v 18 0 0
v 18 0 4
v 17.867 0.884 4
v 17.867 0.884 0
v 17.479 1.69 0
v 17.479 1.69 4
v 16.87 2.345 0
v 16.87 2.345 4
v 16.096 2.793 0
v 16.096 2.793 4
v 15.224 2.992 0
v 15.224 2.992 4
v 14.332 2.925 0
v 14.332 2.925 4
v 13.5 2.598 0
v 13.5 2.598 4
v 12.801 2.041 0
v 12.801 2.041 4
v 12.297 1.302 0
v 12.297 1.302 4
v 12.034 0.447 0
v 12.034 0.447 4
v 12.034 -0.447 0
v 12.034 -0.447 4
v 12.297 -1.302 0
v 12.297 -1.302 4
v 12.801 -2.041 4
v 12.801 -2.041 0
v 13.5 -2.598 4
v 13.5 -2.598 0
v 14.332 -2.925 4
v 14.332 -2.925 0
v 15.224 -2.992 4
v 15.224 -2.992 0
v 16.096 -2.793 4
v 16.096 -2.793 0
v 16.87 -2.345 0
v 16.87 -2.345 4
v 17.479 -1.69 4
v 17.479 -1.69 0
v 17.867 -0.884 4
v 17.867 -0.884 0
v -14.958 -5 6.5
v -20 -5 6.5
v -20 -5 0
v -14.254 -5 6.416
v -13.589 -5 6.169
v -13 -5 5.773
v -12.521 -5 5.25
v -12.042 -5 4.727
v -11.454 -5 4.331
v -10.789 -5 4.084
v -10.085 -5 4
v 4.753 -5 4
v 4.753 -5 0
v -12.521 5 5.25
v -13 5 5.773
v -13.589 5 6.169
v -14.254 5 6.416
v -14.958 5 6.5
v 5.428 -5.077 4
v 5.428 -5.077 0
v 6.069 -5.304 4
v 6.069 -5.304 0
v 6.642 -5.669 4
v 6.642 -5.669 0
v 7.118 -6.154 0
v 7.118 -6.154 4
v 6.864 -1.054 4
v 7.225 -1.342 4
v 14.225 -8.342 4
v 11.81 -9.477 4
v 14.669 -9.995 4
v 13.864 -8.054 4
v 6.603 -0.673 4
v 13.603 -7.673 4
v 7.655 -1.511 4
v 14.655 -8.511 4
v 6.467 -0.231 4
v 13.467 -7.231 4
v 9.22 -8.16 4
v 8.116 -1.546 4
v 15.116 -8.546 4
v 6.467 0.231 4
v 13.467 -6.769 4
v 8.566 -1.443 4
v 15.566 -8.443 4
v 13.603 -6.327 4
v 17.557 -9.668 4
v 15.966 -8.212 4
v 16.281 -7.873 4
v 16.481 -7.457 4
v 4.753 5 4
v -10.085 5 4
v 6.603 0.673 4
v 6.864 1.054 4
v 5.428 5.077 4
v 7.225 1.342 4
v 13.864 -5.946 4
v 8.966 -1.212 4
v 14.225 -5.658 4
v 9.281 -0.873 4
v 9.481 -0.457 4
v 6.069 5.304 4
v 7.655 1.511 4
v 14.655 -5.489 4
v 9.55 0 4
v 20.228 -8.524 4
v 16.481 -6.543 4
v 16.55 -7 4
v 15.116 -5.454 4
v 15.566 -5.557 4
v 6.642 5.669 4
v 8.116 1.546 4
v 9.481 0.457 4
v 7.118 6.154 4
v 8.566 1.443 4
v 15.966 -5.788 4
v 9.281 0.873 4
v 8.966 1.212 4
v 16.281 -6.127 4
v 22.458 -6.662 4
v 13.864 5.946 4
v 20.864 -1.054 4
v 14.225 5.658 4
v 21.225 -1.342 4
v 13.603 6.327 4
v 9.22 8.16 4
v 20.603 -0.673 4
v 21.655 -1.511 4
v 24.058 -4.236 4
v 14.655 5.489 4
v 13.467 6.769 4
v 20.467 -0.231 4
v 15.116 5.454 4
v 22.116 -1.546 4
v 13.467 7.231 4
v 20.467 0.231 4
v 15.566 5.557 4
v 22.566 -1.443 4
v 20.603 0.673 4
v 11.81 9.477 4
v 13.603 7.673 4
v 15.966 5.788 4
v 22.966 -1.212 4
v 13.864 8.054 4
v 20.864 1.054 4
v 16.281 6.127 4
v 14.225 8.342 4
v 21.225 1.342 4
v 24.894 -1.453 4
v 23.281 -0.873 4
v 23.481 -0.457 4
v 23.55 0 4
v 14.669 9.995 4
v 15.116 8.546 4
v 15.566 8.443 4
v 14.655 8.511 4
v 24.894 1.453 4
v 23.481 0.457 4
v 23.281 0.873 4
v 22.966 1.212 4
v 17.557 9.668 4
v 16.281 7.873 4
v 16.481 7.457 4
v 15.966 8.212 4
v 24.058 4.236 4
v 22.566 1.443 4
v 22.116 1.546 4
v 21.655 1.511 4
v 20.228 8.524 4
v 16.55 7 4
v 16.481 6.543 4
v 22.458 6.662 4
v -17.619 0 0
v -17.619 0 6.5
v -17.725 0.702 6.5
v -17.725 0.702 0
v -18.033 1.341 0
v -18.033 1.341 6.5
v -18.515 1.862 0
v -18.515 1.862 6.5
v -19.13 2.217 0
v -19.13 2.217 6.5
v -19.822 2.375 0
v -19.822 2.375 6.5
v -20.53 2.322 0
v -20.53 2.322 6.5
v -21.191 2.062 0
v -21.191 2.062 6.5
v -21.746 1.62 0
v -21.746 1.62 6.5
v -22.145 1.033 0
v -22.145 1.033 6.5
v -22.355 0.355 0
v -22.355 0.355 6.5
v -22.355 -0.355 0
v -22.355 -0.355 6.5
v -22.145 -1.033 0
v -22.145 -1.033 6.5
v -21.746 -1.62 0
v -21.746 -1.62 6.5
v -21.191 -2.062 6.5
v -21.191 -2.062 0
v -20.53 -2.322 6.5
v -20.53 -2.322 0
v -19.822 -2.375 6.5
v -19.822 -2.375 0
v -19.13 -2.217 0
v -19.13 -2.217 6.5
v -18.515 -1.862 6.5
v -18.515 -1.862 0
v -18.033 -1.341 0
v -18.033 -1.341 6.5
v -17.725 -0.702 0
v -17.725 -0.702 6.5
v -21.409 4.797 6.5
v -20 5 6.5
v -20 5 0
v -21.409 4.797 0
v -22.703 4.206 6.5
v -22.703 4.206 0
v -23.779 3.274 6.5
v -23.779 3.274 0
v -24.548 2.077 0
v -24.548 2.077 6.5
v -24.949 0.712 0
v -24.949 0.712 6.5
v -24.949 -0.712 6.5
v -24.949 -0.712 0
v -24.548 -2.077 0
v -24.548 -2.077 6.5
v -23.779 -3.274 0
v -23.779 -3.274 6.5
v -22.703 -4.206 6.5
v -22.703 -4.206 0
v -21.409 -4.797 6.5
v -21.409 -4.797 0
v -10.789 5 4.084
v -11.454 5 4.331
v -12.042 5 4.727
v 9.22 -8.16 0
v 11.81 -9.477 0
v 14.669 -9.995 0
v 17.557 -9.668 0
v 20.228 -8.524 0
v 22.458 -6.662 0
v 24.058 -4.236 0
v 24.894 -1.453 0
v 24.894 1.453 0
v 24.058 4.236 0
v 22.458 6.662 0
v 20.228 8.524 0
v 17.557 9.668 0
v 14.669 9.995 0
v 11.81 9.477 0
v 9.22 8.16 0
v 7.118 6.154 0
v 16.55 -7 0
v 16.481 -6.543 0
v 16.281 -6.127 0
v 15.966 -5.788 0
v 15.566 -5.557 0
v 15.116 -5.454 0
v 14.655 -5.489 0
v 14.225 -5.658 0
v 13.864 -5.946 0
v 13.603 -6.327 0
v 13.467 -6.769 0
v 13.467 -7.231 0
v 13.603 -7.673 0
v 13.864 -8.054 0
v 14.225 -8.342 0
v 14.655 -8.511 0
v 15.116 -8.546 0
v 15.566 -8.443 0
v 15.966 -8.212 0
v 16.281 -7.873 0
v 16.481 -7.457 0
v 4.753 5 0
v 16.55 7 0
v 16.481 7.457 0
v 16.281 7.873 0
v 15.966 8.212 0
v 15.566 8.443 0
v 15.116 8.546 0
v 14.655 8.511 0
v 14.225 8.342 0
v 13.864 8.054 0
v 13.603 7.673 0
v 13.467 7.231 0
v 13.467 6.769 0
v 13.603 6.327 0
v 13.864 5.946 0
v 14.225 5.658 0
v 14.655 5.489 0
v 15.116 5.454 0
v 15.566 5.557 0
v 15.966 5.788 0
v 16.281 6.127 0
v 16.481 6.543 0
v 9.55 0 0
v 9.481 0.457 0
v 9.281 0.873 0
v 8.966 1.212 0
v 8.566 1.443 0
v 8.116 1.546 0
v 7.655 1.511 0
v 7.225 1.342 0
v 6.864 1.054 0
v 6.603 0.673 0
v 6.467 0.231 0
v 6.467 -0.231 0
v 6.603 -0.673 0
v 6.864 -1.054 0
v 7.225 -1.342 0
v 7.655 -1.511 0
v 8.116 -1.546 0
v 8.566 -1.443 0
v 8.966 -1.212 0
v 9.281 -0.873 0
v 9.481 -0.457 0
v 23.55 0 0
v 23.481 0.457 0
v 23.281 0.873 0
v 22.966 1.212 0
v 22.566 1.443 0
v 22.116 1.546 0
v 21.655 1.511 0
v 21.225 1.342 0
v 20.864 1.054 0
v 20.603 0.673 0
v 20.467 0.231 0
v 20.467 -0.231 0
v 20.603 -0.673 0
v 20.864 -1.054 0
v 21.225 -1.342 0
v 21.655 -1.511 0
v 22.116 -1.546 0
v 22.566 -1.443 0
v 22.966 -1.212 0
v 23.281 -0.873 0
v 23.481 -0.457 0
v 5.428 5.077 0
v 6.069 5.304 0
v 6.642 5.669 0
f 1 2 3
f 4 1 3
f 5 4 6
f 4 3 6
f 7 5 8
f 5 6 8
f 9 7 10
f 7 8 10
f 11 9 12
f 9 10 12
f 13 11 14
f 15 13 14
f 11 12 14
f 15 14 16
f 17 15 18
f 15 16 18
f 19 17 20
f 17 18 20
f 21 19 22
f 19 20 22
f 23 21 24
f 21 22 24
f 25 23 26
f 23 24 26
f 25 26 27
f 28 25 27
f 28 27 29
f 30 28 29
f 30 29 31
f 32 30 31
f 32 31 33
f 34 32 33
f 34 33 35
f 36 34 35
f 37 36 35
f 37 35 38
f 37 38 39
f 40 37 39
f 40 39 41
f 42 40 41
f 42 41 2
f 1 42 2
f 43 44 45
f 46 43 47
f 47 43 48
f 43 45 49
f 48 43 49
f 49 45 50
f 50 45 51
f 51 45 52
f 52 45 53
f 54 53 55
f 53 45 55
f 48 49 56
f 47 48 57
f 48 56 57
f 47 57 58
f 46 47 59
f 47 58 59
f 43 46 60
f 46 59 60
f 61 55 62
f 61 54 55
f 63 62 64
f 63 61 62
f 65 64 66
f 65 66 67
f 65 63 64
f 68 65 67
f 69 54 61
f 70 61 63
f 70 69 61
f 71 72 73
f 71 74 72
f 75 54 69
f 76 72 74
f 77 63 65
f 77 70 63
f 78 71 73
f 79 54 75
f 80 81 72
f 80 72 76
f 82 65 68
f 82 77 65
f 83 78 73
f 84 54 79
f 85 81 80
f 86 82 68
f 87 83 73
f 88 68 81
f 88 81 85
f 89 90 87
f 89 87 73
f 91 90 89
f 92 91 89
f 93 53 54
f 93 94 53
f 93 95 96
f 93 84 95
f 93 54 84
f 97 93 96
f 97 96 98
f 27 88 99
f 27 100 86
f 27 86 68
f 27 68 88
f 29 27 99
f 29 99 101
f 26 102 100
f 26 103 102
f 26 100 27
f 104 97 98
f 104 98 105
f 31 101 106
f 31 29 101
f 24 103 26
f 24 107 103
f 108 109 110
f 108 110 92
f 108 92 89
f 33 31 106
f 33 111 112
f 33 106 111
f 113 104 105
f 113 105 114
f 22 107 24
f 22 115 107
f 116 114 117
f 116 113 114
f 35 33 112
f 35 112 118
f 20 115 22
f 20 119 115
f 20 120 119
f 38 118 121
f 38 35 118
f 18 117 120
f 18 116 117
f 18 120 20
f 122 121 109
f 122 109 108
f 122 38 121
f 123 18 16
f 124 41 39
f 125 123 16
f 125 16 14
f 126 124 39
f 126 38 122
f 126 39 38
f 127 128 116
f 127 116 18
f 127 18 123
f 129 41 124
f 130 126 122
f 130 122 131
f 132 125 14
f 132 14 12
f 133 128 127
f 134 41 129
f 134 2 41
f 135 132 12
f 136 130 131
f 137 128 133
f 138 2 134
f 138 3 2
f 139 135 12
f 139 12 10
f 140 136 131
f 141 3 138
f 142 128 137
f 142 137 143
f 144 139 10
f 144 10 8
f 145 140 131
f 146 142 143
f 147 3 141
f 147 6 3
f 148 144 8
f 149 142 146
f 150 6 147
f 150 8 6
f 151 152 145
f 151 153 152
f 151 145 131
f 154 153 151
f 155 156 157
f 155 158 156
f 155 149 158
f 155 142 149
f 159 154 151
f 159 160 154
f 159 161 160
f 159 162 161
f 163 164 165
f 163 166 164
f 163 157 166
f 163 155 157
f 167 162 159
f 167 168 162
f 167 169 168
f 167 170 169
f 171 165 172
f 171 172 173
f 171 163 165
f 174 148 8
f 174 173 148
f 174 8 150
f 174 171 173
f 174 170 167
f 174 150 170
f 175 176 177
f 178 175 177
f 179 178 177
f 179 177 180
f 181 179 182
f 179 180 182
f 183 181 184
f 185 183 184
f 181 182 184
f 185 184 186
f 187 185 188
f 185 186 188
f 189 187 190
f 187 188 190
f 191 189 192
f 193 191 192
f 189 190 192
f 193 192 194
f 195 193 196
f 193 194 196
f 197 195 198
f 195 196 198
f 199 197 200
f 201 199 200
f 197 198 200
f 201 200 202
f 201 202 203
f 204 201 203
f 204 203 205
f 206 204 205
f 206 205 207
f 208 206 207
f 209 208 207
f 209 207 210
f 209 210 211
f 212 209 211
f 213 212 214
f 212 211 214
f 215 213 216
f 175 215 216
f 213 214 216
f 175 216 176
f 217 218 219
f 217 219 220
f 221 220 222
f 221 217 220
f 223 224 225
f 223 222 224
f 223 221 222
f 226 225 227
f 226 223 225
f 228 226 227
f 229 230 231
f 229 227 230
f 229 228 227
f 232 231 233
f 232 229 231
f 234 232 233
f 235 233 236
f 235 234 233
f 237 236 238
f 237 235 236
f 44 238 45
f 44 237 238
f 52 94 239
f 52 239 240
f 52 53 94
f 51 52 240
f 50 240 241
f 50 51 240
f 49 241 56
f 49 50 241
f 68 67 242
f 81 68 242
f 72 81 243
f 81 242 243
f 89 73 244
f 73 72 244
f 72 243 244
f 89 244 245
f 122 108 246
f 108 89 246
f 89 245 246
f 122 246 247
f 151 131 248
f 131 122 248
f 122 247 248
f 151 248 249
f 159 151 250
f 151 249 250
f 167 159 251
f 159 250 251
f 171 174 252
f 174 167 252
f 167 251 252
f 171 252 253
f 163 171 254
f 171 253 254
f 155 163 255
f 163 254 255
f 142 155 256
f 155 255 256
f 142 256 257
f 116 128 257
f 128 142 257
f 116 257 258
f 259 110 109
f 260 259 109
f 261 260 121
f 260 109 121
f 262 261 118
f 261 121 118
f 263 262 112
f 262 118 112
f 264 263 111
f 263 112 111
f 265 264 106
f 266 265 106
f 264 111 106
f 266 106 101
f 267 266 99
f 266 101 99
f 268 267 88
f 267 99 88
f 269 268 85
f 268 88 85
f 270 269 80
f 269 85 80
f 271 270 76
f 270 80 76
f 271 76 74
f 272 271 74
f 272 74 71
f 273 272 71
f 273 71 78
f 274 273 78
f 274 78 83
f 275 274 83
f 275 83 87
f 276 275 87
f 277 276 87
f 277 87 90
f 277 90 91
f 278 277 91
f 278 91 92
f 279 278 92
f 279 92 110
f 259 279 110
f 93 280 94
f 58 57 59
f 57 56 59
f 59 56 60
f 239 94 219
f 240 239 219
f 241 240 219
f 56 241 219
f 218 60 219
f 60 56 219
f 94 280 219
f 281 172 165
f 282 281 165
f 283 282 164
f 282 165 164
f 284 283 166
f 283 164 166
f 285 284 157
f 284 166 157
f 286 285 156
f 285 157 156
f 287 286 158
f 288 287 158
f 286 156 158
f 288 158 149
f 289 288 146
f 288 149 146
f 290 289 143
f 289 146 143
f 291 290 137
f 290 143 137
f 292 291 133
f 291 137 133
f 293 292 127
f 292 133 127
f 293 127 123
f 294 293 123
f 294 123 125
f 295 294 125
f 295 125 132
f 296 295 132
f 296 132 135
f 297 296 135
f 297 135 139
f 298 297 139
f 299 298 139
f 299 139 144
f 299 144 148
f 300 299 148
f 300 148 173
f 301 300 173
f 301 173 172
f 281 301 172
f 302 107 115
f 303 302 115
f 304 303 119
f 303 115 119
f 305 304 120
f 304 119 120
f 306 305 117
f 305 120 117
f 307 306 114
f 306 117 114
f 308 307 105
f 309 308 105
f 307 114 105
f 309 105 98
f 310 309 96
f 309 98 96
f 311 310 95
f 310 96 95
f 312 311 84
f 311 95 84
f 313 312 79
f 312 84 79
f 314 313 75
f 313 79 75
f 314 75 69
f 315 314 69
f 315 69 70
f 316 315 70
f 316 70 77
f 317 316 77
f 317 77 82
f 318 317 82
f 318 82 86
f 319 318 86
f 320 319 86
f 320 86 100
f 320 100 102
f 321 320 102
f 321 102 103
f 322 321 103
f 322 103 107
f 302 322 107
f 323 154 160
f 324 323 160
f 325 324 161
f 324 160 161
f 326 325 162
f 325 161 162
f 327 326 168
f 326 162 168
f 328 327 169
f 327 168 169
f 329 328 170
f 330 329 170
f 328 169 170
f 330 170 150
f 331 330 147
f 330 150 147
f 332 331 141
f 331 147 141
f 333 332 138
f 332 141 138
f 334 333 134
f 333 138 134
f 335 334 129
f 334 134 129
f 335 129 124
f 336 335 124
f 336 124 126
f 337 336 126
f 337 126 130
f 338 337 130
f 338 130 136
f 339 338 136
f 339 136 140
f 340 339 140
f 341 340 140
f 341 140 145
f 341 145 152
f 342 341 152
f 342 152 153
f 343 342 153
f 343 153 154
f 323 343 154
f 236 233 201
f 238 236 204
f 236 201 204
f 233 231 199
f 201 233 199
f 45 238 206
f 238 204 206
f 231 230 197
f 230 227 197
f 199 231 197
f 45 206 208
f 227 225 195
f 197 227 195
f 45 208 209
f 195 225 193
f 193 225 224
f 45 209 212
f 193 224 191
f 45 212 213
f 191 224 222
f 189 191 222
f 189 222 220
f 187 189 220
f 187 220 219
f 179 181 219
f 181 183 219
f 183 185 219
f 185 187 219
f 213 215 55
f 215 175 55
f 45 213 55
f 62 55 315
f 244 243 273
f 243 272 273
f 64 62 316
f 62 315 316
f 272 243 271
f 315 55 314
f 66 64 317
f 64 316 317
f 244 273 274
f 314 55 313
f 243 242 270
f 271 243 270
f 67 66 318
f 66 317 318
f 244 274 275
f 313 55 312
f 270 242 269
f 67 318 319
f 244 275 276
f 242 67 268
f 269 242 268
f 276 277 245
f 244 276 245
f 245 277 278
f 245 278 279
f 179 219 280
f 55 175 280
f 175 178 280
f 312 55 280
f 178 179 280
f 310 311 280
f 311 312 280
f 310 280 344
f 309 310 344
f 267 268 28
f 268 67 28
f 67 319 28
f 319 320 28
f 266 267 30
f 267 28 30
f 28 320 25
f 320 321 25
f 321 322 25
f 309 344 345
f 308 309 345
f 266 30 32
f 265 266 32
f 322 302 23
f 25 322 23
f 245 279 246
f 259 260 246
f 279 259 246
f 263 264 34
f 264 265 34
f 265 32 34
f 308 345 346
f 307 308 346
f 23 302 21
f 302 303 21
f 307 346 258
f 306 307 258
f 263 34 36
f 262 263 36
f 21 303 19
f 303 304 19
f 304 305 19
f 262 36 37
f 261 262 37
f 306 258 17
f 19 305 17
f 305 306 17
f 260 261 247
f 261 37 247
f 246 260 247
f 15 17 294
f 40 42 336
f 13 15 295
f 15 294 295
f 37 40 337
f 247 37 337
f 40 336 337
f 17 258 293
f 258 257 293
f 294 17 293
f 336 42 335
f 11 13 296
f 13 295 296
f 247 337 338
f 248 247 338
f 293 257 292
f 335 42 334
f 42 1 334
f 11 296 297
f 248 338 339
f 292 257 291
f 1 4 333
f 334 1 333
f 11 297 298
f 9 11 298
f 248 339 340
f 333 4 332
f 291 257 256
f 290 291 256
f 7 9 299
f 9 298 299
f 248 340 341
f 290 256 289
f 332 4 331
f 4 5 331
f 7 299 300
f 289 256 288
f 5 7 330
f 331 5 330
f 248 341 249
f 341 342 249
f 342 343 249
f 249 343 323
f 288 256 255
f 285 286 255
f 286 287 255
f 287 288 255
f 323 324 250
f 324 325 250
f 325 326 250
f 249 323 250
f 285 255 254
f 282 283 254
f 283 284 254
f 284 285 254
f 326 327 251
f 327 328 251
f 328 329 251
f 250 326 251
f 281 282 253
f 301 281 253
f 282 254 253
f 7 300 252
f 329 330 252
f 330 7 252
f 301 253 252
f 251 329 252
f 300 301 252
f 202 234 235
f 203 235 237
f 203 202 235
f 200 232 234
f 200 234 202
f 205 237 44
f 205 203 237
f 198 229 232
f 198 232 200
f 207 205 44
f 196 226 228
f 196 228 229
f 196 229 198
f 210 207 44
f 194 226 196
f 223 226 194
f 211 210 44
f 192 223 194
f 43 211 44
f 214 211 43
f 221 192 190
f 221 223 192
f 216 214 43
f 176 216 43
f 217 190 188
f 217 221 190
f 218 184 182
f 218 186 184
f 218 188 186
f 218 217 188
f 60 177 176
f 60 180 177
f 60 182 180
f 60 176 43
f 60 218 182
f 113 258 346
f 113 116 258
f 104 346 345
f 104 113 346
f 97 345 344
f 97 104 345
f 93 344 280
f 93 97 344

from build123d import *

# Parameters (mm, degrees)
BOSS_EXTRUDE3_DEPTH = 6.5
SKETCH9_R           = 2.38125
SKETCH9_R_2         = 3
SKETCH9_R_3         = 1.55
CUT_EXTRUDE4_DEPTH  = 6.5
SKETCH10_W          = 37
SKETCH10_H          = 2.5
CUT_EXTRUDE5_DEPTH  = 15
FILLET6_R           = 3
FILLET7_R           = 3
FILLET8_RADIUS      = 5
FILLET8_LENGTH      = 6.5


with BuildPart() as part:
    # Sketch8 → Boss-Extrude3 (new body)
    with BuildSketch(Plane.XY):
        with BuildLine():
            Line((-25, -5), (6.339745962, -5))
            ThreePointArc((6.339745962, -5), (25, 0), (6.339745962, 5))
            Line((6.339745962, 5), (-25, 5))
            Line((-25, 5), (-25, -5))
        make_face()
    extrude(amount=BOSS_EXTRUDE3_DEPTH)

    # Sketch9 → Cut-Extrude4 (cut)
    with BuildSketch(Plane.XY.offset(6.5)):
        with Locations((-20, 0)):
            Circle(SKETCH9_R)
        with Locations((15, 0)):
            Circle(SKETCH9_R_2)
        with Locations((22, 0)):
            Circle(SKETCH9_R_3)
        with Locations((15, -7)):
            Circle(SKETCH9_R_3)
        with Locations((8, 0)):
            Circle(SKETCH9_R_3)
        with Locations((15, 7)):
            Circle(SKETCH9_R_3)
    extrude(amount=-CUT_EXTRUDE4_DEPTH, mode=Mode.SUBTRACT)

    # Sketch10 → Cut-Extrude5 (cut, symmetric)
    with BuildSketch(Plane(origin=(0, 0, 0), x_dir=(1, 0, 0), z_dir=(0, 1, 0))):
        with Locations((6.5, -5.25)):
            Rectangle(SKETCH10_W, SKETCH10_H)
    extrude(amount=CUT_EXTRUDE5_DEPTH, both=True, mode=Mode.SUBTRACT)

    # Fillet6
    # the kernel refuses this fillet: 3 mm, written as the material it takes off along each edge
    with BuildSketch(Plane(origin=(-12, 12.395099729, 6.5), x_dir=(0, 0, -1), z_dir=(0, -1, 0))) as fillet6_piece_1:
        with BuildLine():
            CenterArc((3, -2.958039892), FILLET6_R, 99.594068227, 80.405931773)
            Line((0, -2.958039892), (-0.06, -2.958039892))
            Line((-0.06, -2.958039892), (-0.06, 0))
            Line((-0.06, 0), (0, 0.06))
            ThreePointArc((0, 0.06), (1.25, 0.06), (2.49, 0.059160798))
            Line((2.49, 0.059160798), (2.5, 0))
        make_face()
    extrude(amount=24.790199458, mode=Mode.SUBTRACT)

    # Fillet7
    fillet7_edges = [part.edges().sort_by_distance(p)[0] for p in [
        (6.339745962, -5, 2),
        (6.339745962, 5, 2),
        (-12, 0, 4),
    ]]
    fillet(fillet7_edges, radius=FILLET7_R)

    # Fillet8: full round fillet: the end face becomes a half cylinder, R = half its width
    fillet8_face = Plane((-25, 0, 3.25), x_dir=(0, 0, 1), z_dir=(-1, 0, 0))  # on the end face: x along it, z out of the body
    fillet8_slab = fillet8_face.offset(-FILLET8_RADIUS / 2) * Box(FILLET8_LENGTH, 2 * FILLET8_RADIUS, FILLET8_RADIUS, mode=Mode.PRIVATE)  # the body's end, R deep
    fillet8_round = Plane((-20, 0, 3.25), x_dir=(-1, 0, 0), z_dir=(0, 0, 1)) * Cylinder(FILLET8_RADIUS, FILLET8_LENGTH, mode=Mode.PRIVATE)  # its axis R under the face
    add(fillet8_slab - fillet8_round, mode=Mode.SUBTRACT)


solid = part.part
